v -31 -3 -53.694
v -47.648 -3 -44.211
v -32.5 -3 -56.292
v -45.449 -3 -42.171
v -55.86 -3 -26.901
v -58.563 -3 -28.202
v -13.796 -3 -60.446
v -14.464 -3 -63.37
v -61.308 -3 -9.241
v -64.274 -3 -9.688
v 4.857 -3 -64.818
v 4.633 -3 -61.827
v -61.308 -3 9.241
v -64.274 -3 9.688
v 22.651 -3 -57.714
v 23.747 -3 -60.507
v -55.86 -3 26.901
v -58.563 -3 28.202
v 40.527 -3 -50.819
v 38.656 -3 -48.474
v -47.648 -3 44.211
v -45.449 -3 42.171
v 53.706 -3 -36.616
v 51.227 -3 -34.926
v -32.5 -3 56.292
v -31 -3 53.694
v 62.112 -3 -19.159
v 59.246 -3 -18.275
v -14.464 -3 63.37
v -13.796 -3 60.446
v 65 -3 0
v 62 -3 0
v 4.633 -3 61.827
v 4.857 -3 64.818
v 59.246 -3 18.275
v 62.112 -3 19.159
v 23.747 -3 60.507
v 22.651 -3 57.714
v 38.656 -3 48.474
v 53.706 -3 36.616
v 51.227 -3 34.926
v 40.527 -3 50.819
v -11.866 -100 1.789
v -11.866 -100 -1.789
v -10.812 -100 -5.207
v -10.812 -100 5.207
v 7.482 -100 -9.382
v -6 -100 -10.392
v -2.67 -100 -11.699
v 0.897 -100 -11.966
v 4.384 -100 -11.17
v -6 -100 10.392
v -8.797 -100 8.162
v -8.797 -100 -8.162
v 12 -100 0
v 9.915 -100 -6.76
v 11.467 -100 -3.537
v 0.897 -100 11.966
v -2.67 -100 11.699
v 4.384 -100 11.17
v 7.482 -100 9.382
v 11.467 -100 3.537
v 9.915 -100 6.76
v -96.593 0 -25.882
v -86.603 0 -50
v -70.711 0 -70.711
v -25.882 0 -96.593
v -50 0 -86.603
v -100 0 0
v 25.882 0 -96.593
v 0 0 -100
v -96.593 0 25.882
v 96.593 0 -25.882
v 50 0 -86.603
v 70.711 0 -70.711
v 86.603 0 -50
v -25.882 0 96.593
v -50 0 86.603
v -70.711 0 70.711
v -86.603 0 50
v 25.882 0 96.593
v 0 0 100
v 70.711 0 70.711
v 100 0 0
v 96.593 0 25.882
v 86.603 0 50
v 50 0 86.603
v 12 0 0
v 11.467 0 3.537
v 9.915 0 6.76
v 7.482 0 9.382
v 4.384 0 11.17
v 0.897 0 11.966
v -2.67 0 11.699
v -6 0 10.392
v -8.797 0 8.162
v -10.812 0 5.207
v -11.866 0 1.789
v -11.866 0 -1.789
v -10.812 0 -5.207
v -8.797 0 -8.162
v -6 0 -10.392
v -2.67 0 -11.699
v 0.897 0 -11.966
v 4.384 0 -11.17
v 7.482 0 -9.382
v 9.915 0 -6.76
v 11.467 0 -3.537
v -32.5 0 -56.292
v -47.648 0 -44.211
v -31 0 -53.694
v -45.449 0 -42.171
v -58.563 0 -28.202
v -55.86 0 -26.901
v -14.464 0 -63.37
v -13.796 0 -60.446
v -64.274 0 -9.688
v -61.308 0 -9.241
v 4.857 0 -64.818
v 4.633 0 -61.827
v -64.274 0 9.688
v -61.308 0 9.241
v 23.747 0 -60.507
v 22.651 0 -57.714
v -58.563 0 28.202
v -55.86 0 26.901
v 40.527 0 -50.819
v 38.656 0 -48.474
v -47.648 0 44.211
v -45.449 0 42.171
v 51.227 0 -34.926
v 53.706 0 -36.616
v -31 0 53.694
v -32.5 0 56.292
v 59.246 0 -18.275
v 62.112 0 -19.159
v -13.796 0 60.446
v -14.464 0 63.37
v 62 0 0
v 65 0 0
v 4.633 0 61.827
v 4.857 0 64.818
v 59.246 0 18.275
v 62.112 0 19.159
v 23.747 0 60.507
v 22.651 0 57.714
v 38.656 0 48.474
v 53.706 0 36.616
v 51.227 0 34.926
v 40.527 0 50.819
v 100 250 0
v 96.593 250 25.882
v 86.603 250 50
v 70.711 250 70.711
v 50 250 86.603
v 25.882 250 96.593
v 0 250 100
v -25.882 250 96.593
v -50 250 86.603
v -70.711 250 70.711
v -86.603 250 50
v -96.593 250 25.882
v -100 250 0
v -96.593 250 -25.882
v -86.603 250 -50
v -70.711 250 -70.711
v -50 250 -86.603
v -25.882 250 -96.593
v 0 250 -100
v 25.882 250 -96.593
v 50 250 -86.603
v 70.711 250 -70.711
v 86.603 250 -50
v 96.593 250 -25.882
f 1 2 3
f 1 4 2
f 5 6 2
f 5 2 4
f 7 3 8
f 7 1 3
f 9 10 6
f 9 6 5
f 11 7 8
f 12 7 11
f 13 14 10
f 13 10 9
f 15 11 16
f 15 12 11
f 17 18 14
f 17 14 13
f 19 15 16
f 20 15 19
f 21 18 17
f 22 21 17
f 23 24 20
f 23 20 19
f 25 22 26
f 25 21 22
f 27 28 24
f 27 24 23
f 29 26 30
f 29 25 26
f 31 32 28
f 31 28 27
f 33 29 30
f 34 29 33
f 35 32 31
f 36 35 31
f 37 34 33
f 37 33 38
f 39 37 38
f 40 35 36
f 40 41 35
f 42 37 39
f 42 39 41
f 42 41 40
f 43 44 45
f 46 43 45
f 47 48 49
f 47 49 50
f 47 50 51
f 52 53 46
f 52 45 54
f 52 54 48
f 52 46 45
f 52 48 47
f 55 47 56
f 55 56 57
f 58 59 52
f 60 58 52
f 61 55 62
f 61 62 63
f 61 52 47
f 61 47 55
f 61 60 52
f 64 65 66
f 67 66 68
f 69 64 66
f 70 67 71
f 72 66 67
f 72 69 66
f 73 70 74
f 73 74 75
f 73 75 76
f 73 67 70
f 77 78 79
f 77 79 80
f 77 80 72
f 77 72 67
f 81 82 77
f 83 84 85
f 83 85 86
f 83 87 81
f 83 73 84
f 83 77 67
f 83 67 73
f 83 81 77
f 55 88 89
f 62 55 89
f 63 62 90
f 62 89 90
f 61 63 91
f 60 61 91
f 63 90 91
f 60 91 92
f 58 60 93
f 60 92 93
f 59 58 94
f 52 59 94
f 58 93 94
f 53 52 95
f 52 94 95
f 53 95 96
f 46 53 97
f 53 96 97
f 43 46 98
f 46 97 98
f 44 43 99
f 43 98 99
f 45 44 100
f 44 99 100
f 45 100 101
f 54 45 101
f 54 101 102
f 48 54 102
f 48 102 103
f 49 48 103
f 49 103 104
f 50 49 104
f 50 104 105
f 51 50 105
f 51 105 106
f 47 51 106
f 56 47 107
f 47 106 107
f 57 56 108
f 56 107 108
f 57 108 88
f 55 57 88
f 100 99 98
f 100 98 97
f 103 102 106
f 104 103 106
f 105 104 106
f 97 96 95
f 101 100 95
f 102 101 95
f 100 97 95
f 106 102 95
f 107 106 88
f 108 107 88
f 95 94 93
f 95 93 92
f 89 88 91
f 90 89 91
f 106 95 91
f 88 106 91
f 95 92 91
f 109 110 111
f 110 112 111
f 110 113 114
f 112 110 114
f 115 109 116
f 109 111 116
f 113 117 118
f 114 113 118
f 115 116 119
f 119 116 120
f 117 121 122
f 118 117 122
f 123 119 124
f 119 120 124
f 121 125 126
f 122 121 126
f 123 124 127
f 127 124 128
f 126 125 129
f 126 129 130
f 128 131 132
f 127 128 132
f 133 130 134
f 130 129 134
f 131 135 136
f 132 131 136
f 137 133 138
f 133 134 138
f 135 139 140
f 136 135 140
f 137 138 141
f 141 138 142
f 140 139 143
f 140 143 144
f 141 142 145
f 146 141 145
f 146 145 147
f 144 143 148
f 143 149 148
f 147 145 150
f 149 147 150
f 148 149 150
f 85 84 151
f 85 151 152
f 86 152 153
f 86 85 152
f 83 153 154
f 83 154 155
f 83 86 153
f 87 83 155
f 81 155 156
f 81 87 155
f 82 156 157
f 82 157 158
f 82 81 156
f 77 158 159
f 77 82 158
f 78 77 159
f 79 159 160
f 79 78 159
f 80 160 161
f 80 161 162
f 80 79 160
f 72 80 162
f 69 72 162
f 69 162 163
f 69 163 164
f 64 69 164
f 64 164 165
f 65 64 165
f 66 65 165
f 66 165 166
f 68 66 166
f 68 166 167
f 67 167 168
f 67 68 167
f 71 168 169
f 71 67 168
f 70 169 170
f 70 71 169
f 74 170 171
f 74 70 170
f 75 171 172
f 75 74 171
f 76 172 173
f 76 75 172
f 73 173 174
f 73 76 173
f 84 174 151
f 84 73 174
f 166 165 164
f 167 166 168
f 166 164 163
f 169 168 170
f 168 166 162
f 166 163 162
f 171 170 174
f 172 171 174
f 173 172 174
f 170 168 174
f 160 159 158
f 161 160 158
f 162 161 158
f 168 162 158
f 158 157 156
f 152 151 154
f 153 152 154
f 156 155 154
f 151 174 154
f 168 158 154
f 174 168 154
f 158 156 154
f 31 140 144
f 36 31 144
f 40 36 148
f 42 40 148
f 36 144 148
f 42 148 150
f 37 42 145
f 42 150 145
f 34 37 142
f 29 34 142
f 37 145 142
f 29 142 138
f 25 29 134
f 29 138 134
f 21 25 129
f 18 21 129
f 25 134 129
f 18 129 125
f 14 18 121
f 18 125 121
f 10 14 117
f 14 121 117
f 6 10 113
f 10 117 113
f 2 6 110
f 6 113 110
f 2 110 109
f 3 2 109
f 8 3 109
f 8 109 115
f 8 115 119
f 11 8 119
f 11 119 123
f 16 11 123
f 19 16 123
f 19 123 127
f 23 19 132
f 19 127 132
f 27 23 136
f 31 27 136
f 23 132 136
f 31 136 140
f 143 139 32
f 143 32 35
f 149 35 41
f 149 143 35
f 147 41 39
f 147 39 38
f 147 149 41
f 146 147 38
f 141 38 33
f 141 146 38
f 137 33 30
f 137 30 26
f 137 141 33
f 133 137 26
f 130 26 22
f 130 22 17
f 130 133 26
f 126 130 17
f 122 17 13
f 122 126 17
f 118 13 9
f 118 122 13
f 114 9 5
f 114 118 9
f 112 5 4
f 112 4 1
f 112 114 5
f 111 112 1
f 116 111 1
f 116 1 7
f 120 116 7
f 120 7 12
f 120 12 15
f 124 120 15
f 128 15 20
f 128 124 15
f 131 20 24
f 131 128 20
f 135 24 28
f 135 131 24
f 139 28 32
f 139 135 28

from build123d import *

# Parameters (mm, degrees)
F0_R     = 12
F1_DEPTH = 100
F0_R_2   = 65
F0_R_3   = 62
F2_DEPTH = 3
F0_R_4   = 100
F3_DEPTH = 250


with BuildPart() as f1:
    # F0 (on Front) → F1 (new body)
    with BuildSketch(Plane.XZ):
        Circle(F0_R)
    extrude(amount=F1_DEPTH)


with BuildPart() as f2:
    # F0 (on Front) → F2 (new body)
    with BuildSketch(Plane.XZ):
        Circle(F0_R_2)
        Circle(F0_R_3, mode=Mode.SUBTRACT)
    extrude(amount=F2_DEPTH)


with BuildPart() as f3:
    # F0 (on Front) → F3 (new body)
    with BuildSketch(Plane.XZ):
        Circle(F0_R_4)
        Circle(F0_R_2, mode=Mode.SUBTRACT)
        Circle(F0_R_2)
        Circle(F0_R_3, mode=Mode.SUBTRACT)
        Circle(F0_R_3)
        Circle(F0_R, mode=Mode.SUBTRACT)
        Circle(F0_R)
    extrude(amount=-F3_DEPTH)


solid = Compound([f1.part, f2.part, f3.part])
